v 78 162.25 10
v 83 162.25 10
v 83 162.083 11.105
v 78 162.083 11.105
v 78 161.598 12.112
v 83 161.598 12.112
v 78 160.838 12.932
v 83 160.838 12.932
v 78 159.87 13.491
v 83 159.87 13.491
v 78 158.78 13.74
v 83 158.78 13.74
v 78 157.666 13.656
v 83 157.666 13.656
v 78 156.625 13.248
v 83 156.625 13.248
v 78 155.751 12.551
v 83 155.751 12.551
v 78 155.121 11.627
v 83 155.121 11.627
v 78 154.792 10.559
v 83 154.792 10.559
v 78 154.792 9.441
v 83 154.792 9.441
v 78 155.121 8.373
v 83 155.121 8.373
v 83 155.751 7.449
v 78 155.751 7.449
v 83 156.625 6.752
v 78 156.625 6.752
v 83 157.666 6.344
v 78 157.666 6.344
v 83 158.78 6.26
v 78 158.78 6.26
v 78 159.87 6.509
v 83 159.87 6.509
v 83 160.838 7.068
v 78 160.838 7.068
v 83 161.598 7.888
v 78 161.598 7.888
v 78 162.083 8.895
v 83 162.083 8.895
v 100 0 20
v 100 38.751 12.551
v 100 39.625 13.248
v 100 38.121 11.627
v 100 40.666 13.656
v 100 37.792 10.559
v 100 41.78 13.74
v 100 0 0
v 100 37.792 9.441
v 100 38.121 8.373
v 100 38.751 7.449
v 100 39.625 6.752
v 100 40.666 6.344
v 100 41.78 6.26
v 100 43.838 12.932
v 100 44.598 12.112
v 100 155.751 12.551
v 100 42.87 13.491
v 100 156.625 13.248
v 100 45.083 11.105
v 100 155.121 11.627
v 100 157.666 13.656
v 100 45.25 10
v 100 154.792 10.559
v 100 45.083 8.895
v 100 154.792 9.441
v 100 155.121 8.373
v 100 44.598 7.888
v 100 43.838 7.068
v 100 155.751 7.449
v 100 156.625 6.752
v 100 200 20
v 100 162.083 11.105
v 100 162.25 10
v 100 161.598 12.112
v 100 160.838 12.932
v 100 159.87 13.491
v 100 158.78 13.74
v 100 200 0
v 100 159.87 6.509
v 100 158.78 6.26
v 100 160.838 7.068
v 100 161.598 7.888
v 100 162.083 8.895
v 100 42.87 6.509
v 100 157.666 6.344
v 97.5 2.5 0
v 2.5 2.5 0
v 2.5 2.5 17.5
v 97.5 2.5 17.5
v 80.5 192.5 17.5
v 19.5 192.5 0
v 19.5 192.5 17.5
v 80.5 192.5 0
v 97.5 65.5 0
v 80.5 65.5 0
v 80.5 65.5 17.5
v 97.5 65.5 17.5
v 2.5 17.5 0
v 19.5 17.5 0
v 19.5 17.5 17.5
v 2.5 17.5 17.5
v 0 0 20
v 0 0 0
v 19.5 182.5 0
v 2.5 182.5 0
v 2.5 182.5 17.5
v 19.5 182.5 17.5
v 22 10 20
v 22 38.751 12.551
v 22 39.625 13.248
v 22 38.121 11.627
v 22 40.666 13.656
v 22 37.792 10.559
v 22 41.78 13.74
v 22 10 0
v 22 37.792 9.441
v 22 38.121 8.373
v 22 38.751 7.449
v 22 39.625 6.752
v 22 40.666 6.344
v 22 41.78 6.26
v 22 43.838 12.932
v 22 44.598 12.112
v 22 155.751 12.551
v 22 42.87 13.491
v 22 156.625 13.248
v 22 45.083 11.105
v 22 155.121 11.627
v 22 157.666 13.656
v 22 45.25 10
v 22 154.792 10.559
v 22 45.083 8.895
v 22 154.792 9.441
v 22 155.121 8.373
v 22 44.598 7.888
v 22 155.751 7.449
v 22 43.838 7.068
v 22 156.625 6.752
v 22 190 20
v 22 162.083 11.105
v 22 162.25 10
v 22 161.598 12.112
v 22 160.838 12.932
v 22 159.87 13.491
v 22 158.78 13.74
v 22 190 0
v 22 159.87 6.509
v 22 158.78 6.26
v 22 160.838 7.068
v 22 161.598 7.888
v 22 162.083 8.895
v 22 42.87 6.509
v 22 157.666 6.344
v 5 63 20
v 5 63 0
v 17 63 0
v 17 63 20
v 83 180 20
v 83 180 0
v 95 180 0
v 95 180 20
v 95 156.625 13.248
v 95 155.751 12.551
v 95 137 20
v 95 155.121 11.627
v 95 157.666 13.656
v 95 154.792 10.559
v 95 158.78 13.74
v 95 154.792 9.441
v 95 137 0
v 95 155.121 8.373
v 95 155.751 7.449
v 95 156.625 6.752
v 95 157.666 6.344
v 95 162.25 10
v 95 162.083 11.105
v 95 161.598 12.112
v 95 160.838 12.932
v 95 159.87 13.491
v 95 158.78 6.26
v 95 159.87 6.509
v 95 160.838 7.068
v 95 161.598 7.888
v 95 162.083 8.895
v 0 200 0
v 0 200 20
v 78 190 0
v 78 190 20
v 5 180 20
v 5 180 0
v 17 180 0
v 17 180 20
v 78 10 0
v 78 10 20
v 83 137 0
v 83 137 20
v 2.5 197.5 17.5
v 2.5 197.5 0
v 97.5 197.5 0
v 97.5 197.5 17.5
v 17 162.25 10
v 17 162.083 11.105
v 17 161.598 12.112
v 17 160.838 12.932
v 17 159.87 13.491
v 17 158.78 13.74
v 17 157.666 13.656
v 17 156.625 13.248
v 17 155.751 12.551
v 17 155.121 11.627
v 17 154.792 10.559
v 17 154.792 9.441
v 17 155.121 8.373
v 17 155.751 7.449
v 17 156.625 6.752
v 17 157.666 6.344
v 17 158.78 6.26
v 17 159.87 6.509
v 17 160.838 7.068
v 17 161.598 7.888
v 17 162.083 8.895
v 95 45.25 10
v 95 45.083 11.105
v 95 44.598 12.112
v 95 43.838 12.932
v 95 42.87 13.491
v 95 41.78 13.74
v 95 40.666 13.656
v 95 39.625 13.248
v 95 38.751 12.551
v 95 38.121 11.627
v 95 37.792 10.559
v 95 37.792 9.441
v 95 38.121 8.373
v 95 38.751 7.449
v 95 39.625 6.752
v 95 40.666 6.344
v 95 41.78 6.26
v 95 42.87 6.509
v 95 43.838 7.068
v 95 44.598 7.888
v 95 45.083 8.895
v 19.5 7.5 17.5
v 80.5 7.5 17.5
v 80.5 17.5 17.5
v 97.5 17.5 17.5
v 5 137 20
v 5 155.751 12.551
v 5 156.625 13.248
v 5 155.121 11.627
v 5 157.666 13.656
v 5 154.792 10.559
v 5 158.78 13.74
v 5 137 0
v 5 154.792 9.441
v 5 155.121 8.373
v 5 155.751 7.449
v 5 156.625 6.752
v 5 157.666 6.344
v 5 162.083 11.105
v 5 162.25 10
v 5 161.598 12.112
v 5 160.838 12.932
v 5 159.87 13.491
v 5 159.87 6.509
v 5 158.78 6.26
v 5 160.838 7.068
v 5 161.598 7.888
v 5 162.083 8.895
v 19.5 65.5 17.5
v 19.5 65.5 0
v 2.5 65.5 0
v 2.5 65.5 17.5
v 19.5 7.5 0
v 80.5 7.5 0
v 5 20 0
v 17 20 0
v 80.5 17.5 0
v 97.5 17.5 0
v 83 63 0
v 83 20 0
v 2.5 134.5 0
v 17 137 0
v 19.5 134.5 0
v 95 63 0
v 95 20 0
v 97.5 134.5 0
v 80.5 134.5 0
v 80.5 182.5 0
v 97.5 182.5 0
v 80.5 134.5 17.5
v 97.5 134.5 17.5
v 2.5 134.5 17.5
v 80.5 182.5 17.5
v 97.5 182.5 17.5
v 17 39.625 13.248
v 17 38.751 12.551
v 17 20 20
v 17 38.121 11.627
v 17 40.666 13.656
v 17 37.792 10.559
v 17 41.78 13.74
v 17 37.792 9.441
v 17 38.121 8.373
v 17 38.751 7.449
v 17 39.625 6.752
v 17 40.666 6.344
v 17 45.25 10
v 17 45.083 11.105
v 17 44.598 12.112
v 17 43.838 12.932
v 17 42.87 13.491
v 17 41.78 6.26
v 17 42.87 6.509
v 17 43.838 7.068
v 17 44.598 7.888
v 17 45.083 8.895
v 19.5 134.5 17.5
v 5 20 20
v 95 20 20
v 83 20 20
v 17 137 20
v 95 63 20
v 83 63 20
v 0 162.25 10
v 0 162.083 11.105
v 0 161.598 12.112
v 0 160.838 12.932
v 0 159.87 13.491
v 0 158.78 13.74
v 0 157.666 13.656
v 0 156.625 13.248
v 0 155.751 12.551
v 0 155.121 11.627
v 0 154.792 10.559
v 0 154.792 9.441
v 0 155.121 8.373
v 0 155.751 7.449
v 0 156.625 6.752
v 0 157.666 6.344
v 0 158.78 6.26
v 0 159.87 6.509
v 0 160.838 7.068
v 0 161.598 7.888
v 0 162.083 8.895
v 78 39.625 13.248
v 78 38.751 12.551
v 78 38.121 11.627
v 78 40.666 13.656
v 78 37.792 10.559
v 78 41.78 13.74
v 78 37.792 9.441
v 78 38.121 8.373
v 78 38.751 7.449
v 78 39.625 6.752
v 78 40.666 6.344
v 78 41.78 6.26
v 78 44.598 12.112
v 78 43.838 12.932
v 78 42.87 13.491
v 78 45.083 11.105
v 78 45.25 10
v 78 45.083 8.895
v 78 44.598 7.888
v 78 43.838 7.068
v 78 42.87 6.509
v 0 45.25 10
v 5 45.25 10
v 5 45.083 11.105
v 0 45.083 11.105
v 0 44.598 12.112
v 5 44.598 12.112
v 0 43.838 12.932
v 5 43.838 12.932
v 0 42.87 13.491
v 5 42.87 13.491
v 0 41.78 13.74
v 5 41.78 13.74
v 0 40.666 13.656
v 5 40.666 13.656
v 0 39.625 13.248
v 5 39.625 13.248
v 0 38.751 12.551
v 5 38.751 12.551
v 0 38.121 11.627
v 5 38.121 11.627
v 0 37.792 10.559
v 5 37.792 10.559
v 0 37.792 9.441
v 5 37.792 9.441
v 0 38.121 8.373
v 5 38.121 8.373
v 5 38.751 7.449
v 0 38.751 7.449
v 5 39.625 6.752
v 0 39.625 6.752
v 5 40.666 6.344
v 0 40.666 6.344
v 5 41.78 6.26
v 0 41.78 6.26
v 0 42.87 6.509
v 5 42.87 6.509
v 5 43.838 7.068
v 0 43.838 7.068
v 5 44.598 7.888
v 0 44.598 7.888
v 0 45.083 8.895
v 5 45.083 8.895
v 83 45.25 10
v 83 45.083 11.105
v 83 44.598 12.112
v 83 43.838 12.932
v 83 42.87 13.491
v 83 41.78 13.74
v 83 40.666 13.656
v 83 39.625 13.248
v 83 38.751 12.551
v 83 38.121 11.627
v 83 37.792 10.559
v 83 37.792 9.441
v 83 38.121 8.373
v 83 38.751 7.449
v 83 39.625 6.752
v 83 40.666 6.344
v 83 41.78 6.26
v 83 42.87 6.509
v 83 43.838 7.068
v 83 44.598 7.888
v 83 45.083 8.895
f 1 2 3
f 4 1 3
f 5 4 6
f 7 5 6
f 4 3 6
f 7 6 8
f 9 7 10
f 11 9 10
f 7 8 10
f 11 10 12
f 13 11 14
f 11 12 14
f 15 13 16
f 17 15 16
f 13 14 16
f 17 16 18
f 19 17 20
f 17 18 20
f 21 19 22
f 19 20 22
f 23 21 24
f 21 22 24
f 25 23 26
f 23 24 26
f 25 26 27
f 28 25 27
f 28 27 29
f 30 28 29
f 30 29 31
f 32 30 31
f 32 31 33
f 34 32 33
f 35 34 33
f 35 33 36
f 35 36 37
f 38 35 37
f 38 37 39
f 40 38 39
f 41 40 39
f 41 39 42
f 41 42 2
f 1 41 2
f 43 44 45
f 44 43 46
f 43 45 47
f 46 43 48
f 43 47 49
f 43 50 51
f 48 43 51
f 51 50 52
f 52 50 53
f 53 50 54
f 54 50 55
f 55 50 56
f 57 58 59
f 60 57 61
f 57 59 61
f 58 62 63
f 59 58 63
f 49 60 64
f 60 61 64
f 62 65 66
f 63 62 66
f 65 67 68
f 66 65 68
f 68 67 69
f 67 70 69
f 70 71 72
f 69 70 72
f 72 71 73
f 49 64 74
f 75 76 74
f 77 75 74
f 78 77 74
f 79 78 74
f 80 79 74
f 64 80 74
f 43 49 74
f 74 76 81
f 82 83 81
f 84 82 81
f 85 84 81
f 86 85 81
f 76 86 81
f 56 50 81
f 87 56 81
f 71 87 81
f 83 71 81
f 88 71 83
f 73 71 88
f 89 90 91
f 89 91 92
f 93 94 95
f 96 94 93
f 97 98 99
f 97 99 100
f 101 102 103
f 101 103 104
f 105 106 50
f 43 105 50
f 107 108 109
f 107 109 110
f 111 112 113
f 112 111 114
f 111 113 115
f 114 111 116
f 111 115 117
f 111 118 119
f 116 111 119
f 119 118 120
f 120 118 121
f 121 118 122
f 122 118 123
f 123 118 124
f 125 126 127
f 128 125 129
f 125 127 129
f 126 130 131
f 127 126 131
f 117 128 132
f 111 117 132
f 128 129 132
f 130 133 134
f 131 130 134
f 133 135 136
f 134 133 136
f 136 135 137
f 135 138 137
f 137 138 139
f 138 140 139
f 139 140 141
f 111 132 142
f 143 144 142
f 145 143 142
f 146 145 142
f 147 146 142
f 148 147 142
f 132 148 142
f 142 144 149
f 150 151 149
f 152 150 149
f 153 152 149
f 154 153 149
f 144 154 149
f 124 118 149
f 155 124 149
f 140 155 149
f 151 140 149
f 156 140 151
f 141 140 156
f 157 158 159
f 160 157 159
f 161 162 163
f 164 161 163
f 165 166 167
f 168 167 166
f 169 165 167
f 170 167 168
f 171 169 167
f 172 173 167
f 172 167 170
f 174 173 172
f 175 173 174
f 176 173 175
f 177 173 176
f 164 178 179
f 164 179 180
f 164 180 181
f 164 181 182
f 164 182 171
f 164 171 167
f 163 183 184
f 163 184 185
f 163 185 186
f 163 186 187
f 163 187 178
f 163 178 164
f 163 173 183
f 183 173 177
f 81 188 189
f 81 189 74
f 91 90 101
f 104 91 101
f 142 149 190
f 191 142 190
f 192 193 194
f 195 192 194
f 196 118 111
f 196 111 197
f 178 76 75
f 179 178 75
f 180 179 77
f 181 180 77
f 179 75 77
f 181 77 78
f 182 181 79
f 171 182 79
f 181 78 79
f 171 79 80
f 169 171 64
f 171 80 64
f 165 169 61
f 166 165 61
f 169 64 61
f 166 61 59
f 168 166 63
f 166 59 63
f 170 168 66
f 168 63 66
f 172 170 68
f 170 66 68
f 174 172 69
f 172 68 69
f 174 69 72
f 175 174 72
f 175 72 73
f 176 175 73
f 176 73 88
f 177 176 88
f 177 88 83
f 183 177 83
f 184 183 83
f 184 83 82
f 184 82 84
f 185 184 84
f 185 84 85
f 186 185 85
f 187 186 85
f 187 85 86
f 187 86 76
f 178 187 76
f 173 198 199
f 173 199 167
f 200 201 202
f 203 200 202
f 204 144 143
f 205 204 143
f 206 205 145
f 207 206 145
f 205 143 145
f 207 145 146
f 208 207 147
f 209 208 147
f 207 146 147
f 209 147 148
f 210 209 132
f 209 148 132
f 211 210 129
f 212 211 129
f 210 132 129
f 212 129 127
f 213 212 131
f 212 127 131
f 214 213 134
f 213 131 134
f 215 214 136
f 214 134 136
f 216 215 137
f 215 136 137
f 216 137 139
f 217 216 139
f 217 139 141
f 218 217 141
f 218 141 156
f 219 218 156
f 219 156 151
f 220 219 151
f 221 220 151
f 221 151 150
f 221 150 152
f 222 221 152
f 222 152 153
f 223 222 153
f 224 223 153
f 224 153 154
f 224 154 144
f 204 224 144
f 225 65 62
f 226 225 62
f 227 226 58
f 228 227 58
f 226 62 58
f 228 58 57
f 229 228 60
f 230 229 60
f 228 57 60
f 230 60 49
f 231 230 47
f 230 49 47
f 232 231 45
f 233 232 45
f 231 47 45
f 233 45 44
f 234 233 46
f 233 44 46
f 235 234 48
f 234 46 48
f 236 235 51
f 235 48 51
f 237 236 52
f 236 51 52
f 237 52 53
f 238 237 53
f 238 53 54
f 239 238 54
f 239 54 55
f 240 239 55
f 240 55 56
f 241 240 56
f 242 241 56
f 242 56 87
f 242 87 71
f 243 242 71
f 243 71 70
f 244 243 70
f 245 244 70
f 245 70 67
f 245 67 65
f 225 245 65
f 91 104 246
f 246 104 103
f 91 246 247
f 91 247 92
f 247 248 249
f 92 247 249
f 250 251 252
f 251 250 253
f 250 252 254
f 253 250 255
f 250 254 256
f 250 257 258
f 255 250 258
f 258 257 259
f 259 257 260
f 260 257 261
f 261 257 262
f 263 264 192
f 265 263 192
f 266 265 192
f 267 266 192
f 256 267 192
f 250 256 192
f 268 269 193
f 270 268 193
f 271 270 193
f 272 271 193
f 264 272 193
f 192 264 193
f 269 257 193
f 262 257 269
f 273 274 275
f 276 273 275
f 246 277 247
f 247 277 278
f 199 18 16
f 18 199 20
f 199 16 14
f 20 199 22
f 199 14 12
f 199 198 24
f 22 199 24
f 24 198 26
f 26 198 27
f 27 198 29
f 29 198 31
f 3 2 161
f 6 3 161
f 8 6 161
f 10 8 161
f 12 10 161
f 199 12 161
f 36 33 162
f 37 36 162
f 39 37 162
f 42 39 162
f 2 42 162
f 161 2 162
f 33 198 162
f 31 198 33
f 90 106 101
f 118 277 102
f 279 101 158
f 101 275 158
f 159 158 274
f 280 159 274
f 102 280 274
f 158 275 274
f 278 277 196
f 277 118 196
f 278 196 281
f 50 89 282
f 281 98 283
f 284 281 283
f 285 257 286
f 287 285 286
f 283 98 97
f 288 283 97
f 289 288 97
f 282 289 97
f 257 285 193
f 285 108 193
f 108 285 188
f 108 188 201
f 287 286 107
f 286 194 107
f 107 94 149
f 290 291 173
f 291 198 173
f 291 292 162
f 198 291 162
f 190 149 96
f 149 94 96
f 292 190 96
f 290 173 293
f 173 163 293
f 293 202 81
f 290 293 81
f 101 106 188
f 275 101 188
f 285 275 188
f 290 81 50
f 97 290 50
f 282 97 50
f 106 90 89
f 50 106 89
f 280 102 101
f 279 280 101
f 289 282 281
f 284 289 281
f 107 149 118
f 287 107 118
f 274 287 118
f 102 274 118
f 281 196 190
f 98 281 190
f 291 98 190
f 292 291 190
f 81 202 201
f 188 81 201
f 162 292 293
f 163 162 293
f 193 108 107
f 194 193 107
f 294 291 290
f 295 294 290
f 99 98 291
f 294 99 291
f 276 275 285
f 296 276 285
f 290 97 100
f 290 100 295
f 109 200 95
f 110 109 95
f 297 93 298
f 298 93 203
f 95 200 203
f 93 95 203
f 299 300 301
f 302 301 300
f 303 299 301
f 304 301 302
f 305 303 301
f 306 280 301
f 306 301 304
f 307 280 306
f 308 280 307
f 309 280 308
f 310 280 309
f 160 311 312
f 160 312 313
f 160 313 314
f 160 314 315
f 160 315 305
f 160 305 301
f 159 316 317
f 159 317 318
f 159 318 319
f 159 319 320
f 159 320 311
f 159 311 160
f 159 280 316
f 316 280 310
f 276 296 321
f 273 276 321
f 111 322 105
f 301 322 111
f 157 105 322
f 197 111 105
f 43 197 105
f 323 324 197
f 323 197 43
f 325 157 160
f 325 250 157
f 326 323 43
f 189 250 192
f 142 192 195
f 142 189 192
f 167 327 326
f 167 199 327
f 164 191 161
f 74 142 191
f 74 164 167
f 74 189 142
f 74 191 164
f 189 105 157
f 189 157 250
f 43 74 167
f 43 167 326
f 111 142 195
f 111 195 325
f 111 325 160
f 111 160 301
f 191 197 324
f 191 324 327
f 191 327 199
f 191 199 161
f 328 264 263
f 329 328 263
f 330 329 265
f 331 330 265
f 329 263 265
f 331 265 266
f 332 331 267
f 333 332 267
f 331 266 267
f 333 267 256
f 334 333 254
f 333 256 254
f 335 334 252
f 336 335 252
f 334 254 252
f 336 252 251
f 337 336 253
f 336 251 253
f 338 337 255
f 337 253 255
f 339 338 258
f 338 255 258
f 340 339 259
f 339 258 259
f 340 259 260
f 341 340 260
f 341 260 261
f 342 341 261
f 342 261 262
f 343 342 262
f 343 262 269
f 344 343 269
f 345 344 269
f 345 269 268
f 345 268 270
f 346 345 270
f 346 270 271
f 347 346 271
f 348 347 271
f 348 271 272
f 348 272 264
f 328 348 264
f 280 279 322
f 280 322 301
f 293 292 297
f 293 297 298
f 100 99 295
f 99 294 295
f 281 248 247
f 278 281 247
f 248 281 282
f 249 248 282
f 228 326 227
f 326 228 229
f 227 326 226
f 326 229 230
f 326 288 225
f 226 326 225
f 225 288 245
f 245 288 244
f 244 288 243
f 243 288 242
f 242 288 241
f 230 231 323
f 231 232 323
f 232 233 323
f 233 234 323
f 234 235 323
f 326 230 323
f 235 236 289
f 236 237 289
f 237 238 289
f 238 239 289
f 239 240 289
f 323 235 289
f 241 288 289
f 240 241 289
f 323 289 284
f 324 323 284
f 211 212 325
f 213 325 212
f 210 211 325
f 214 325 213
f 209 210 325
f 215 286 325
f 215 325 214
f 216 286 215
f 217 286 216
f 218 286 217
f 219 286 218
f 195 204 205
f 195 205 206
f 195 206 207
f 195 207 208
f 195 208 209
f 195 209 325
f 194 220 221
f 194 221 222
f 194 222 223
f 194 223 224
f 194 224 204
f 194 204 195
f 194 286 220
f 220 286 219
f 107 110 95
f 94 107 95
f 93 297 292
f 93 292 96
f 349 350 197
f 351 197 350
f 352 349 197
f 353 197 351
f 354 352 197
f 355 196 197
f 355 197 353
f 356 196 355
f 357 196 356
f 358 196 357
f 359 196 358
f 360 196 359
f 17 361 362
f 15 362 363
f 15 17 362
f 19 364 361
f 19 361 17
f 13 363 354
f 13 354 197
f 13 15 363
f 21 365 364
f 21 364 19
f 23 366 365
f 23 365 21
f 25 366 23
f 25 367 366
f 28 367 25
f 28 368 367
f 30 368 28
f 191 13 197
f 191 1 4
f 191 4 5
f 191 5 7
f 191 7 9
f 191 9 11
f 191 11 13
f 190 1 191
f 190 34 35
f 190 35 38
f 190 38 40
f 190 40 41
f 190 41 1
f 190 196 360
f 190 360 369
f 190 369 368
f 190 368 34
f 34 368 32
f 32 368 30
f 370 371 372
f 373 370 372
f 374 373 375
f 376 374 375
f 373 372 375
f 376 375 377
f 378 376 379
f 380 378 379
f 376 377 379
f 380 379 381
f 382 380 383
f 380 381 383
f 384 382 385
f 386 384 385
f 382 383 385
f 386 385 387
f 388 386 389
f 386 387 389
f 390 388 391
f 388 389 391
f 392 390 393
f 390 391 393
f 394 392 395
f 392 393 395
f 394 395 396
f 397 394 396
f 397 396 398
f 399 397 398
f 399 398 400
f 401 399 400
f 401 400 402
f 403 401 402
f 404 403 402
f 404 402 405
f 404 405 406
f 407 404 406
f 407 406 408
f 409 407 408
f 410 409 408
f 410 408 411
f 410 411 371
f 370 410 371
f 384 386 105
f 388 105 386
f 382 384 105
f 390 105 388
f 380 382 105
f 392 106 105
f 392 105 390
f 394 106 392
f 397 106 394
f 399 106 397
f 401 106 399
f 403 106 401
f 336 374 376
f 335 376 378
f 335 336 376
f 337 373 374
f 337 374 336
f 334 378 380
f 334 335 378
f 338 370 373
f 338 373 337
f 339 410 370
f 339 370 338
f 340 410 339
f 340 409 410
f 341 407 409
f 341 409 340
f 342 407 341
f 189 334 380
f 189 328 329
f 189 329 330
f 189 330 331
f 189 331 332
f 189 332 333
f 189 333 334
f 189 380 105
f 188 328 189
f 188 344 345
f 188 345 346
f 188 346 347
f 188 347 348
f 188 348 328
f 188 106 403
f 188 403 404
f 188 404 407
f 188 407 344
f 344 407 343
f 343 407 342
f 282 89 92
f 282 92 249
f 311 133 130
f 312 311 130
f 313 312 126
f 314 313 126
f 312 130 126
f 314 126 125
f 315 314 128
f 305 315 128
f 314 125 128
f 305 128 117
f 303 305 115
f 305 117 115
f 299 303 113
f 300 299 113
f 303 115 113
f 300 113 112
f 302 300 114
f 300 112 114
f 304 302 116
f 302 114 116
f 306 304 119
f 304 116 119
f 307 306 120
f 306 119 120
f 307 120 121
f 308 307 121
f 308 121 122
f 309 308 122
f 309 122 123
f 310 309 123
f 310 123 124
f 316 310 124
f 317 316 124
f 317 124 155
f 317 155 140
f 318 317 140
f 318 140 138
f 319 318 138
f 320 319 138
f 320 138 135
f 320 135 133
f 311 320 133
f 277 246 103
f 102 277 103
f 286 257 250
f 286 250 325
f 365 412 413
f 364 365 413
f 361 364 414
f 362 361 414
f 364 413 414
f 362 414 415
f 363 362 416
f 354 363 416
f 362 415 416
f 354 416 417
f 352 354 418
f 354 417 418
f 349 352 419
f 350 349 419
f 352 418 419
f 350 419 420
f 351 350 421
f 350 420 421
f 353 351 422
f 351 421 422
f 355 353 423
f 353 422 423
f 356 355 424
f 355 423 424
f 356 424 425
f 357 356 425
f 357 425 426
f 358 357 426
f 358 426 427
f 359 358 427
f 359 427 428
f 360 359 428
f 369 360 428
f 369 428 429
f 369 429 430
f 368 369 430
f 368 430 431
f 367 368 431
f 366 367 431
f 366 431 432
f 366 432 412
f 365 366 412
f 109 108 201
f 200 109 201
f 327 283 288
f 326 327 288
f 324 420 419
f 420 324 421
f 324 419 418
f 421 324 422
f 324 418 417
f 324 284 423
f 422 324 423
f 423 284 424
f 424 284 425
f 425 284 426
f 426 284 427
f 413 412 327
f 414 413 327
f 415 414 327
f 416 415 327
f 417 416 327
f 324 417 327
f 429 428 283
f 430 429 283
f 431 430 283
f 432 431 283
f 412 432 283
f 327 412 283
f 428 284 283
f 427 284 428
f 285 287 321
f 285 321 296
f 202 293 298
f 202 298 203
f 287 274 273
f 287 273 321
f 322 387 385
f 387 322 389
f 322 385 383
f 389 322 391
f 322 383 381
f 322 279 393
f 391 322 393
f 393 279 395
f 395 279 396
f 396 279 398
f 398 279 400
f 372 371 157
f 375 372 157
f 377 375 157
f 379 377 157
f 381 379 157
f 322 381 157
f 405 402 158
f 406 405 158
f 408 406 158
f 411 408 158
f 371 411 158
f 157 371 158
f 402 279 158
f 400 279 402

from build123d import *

# Parameters (mm, degrees)
F0_W        = 100
F0_H        = 200
F0_W_2      = 12
F0_H_2      = 43
F0_W_3      = 56
F0_H_3      = 180
F1_DEPTH    = 20
F2_R        = 3.75
F3_DEPTH    = 100.001
F4_T        = 2.5
F4_T3_DEPTH = 25


# Not quite as in the source:
# - a shell that OpenCascade refuses in one call is made with other operations: the cavity is built on its own and cut out


with BuildPart() as f1:
    # F0 (on Top) → F1 (new body)
    with BuildSketch(Plane.XY):
        with Locations((50, 100)):
            Rectangle(F0_W, F0_H)
        with Locations((11, 41.5)):
            Rectangle(F0_W_2, F0_H_2, mode=Mode.SUBTRACT)
        Polygon((89, 20), (83, 20), (83, 63), (95, 63), (95, 20), align=None, mode=Mode.SUBTRACT)
        with Locations((11, 158.5)):
            Rectangle(F0_W_2, F0_H_2, mode=Mode.SUBTRACT)
        with Locations((50, 100)):
            Rectangle(F0_W_3, F0_H_3, mode=Mode.SUBTRACT)
        with Locations((89, 158.5)):
            Rectangle(F0_W_2, F0_H_2, mode=Mode.SUBTRACT)
    extrude(amount=F1_DEPTH)

    # F2 (on face) → F3 (cut, through all)
    with BuildSketch(Plane.YZ.offset(100)):
        with Locations((41.5, 10)):
            Circle(F2_R)
        with Locations((158.5, 10)):
            Circle(F2_R)
    extrude(amount=-F3_DEPTH, mode=Mode.SUBTRACT)

    # F4: shell of thickness 2.5, made by hand


with BuildPart() as f4_core1:
    # F4_t2: copy of F1
    add(f1.part)

    # the walls: a layer under each face that stays
    f4_faces = [f4_core1.faces().sort_by_distance(p)[0] for p in [
        (0, 100, 10),
        (50, 200, 10),
        (16.6666666667, 100, 20),
        (50, 0, 10),
        (2.5, 154.75, 10),
        (2.5, 37.75, 10),
        (100, 100, 10),
        (17, 55.8333333333, 16.6666666667),
        (11, 20, 10),
        (5, 27.1666666667, 16.6666666667),
        (11, 63, 10),
        (83, 27.1666666667, 16.6666666667),
        (89, 63, 10),
        (95, 55.8333333333, 16.6666666667),
        (89, 20, 10),
        (11, 180, 10),
        (17, 172.8333333333, 16.6666666667),
        (11, 137, 10),
        (5, 144.1666666667, 16.6666666667),
        (22, 100, 10),
        (50, 190, 10),
        (78, 100, 10),
        (50, 10, 10),
        (83, 144.1666666667, 16.6666666667),
        (89, 180, 10),
        (95, 172.8333333333, 16.6666666667),
        (89, 137, 10),
        (97.5, 37.75, 10),
        (97.5, 154.75, 10),
        (19.5, 37.75, 10),
        (80.5, 37.75, 10),
        (19.5, 154.75, 10),
        (80.5, 154.75, 10),
    ]]
    thicken(f4_faces, amount=-F4_T, mode=Mode.SUBTRACT)

    # F4_s4 → F4_t3 (cut)
    with BuildSketch(Plane.XY.offset(-2.5)):
        Polygon((16.975, 62.975), (19.5, 63), (19.5, 65.5), (17, 65.5), align=None)
        Polygon((16.975, 20.025), (19.5, 20), (19.5, 17.5), (17, 17.5), align=None)
        Polygon((5.025, 20.025), (5, 17.5), (2.5, 17.5), (2.5, 20), align=None)
        Polygon((5.025, 62.975), (2.5, 63), (2.5, 65.5), (5, 65.5), align=None)
        Polygon((83.025, 20.025), (80.5, 20), (80.5, 17.5), (83, 17.5), align=None)
        Polygon((83.025, 62.975), (80.5, 63), (80.5, 65.5), (83, 65.5), align=None)
        Polygon((94.975, 62.975), (95, 65.5), (97.5, 65.5), (97.5, 63), align=None)
        Polygon((94.975, 20.025), (97.5, 20), (97.5, 17.5), (95, 17.5), align=None)
        Polygon((5.025, 179.975), (5, 182.5), (2.5, 182.5), (2.5, 180), align=None)
        Polygon((16.975, 179.975), (17, 182.5), (19.5, 182.5), (19.5, 180), align=None)
        Polygon((16.975, 137.025), (19.5, 137), (19.5, 134.5), (17, 134.5), align=None)
        Polygon((5.025, 137.025), (5, 134.5), (2.5, 134.5), (2.5, 137), align=None)
        Polygon((22.025, 10.025), (19.5, 10), (19.5, 7.5), (22, 7.5), align=None)
        Polygon((22.025, 189.975), (19.5, 190), (19.5, 192.5), (22, 192.5), align=None)
        Polygon((77.975, 189.975), (78, 192.5), (80.5, 192.5), (80.5, 190), align=None)
        Polygon((77.975, 10.025), (80.5, 10), (80.5, 7.5), (78, 7.5), align=None)
        Polygon((83.025, 137.025), (80.5, 137), (80.5, 134.5), (83, 134.5), align=None)
        Polygon((83.025, 179.975), (80.5, 180), (80.5, 182.5), (83, 182.5), align=None)
        Polygon((94.975, 179.975), (95, 182.5), (97.5, 182.5), (97.5, 180), align=None)
        Polygon((94.975, 137.025), (97.5, 137), (97.5, 134.5), (95, 134.5), align=None)
    extrude(amount=F4_T3_DEPTH, mode=Mode.SUBTRACT)


with BuildPart() as f1_1:
    add(f1.part)

    # what is left inside the walls is the cavity
    f4_cavity = [f4_core1.part.solids().sort_by_distance(p)[0] for p in [
        (50, 197.475, 11.666667),
        (2.525, 100, 11.666667),
        (50, 2.525, 11.666667),
        (80.525, 100, 11.666667),
    ]]
    add(f4_cavity, mode=Mode.SUBTRACT)


solid = f1_1.part
